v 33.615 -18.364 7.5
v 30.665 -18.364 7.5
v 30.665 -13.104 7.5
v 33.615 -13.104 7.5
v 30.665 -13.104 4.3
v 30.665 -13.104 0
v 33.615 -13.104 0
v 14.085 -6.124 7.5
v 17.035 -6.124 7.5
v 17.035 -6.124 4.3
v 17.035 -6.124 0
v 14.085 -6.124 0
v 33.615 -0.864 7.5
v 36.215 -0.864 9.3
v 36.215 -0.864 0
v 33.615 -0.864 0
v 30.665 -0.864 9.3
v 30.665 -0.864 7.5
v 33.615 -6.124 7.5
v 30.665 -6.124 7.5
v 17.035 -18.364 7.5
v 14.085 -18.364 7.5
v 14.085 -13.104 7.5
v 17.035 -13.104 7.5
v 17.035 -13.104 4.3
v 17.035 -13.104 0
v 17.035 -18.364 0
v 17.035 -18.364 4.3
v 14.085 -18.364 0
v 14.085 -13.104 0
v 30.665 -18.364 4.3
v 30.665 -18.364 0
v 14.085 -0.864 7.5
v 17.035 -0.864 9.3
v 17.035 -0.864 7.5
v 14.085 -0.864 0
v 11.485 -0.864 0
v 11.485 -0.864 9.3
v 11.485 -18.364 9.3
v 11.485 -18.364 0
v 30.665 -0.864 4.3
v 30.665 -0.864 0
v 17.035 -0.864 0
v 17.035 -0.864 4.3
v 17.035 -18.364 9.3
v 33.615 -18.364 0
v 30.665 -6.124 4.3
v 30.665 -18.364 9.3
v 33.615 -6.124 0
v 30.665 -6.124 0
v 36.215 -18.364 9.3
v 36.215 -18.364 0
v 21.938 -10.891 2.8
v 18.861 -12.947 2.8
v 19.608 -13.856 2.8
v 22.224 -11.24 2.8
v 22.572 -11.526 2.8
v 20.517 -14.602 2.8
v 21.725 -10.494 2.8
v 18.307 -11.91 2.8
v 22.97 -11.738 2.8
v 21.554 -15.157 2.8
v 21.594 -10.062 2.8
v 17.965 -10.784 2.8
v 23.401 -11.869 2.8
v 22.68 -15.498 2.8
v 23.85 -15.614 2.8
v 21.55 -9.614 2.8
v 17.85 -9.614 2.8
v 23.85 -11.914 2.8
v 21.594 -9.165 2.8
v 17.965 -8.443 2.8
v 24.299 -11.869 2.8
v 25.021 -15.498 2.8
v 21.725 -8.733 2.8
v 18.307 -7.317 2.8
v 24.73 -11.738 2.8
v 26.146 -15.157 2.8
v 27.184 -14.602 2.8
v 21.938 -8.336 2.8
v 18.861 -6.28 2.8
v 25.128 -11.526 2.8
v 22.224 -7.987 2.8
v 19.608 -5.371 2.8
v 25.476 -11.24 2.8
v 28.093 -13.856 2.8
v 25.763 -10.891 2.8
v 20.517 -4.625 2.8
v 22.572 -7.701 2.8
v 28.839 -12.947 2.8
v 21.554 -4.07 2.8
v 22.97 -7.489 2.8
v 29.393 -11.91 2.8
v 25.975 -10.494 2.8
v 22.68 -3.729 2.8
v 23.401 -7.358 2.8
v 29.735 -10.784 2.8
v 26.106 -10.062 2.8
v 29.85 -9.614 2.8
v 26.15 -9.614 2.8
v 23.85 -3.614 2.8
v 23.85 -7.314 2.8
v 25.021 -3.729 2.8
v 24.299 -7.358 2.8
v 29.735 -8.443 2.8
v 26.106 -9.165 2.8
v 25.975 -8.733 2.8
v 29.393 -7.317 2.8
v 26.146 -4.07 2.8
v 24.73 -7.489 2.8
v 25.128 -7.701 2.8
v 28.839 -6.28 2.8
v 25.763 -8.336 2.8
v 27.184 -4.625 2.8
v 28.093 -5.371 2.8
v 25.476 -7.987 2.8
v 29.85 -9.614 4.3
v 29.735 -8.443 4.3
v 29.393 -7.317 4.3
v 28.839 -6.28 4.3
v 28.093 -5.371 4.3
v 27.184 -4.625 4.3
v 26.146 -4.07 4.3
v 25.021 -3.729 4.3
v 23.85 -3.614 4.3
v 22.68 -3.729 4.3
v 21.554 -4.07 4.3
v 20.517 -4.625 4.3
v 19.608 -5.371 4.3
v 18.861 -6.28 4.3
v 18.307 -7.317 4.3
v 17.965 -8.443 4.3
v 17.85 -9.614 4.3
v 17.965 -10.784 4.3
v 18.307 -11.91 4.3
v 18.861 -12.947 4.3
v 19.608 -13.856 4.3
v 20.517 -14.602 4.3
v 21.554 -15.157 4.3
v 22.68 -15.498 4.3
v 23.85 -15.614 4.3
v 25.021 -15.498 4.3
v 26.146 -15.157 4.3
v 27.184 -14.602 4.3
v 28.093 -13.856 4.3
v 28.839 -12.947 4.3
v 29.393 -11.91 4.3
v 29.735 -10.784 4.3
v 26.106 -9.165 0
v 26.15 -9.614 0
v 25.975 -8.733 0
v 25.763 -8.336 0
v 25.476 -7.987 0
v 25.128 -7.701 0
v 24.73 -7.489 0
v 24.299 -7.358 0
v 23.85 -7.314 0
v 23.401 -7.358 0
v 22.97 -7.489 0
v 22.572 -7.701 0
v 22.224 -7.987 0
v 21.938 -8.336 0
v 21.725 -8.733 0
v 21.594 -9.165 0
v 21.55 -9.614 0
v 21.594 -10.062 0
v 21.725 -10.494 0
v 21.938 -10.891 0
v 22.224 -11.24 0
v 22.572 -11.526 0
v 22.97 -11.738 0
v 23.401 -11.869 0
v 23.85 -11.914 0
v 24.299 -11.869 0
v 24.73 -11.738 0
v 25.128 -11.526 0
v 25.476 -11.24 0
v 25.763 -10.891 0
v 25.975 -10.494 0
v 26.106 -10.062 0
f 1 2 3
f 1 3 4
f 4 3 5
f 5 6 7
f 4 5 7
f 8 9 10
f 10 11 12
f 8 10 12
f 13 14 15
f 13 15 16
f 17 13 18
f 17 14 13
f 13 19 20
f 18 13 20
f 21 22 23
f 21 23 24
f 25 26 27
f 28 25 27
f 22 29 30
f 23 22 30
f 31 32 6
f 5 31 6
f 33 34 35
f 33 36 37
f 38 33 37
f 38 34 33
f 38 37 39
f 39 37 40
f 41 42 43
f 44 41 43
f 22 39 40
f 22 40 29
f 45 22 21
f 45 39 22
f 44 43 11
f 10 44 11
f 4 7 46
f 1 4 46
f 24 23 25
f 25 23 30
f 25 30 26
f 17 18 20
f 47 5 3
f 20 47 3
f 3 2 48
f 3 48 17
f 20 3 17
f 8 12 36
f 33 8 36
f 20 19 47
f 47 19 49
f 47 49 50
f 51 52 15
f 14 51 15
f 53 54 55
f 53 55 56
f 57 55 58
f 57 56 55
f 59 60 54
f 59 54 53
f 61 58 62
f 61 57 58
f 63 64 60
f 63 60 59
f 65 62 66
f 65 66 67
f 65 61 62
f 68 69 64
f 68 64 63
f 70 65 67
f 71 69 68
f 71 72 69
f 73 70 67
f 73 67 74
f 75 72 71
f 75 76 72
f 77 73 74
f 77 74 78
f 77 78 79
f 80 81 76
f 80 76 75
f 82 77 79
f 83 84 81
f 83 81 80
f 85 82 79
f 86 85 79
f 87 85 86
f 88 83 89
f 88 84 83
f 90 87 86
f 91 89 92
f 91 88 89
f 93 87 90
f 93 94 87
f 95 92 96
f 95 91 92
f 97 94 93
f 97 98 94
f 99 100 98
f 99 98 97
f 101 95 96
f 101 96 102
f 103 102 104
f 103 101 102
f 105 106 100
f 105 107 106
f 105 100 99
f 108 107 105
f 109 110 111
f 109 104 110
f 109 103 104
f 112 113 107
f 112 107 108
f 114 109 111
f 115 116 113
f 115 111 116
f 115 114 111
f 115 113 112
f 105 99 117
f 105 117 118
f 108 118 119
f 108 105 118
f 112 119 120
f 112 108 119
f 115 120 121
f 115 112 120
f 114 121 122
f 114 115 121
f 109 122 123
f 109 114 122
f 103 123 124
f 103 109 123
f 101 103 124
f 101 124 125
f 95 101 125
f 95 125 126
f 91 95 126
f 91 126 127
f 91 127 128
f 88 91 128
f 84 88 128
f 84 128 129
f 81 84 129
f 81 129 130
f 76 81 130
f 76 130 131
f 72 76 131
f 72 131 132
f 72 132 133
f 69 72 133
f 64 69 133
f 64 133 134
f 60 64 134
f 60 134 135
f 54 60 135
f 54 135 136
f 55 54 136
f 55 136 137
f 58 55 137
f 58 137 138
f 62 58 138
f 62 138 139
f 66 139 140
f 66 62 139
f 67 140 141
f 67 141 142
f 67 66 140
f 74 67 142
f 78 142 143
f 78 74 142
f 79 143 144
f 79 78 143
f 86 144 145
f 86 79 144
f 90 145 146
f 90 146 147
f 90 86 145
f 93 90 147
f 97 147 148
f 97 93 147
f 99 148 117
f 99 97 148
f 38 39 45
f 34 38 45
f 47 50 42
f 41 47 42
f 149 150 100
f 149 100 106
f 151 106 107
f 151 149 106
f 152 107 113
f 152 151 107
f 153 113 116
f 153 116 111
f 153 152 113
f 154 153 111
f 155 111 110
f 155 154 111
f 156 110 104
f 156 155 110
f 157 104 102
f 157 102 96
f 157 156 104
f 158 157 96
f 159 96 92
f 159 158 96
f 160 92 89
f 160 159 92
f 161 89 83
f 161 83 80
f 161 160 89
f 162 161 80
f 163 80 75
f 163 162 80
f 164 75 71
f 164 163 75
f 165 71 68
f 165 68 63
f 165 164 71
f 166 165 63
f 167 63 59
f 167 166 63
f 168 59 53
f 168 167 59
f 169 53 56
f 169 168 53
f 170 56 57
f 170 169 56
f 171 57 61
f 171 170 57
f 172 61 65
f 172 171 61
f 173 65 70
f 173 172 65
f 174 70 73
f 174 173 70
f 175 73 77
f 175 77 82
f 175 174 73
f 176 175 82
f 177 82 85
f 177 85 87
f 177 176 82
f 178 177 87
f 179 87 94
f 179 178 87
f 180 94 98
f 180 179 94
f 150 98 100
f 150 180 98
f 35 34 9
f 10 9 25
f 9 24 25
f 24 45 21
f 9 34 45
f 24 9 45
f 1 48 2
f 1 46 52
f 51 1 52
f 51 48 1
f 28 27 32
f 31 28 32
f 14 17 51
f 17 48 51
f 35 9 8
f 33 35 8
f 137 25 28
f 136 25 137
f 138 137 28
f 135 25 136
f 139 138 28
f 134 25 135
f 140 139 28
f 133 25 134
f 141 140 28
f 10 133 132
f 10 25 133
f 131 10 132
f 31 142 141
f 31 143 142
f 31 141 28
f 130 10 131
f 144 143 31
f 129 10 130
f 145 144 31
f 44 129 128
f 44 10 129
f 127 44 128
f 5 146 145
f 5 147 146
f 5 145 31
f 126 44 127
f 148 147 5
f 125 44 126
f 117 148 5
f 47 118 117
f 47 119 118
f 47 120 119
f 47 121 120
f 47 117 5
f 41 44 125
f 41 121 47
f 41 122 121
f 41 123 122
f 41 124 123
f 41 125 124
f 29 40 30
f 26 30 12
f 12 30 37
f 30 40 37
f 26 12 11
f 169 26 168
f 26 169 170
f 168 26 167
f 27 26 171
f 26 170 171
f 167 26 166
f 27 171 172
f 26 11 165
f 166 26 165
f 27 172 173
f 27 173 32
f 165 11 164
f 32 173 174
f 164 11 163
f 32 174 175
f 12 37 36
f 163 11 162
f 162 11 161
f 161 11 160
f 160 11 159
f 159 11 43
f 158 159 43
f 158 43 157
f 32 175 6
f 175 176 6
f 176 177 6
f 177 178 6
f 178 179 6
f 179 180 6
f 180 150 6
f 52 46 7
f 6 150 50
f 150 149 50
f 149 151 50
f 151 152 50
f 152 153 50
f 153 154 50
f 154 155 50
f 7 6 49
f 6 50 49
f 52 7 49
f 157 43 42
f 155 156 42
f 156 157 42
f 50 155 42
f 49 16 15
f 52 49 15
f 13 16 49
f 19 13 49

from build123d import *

# Parameters (mm, degrees)
F1_DEPTH = 9.3
F0_R     = 6
F2_DEPTH = 4.3
F0_R_2   = 2.3
F3_DEPTH = 2.8
F5_DEPTH = 5.26
F6_DEPTH = 5.26
F8_DEPTH = 5.26
F9_DEPTH = 5.26


with BuildPart() as f1:
    # F0 (on Top) → F1 (new body)
    with BuildSketch(Plane.XY):
        Polygon((36.2151488662, -0.8635242283), (33.6151488662, -0.8635242283), (33.6151488662, -6.1235242283), (30.6651488662, -6.1235242283), (30.6651488662, -13.1035242283), (33.6151488662, -13.1035242283), (33.6151488662, -18.3635242283), (36.2151488662, -18.3635242283), align=None)
    extrude(amount=F1_DEPTH)



with BuildPart() as f1b:
    # F0 (on Top) → F1, piece 2 (new body)
    with BuildSketch(Plane.XY):
        Polygon((14.0851488662, -0.8635242283), (11.4851488662, -0.8635242283), (11.4851488662, -18.3635242283), (14.0851488662, -18.3635242283), (14.0851488662, -13.1035242283), (17.0351488662, -13.1035242283), (17.0351488662, -6.1235242283), (14.0851488662, -6.1235242283), align=None)
    extrude(amount=F1_DEPTH)


with BuildPart() as f1_1:
    add(f1.part)

    add(f1b.part)  # F2 merges F1b
    # F0 (on Top) → F2 (join)
    with BuildSketch(Plane.XY):
        Polygon((30.6651488662, -0.8635242283), (17.0351488662, -0.8635242283), (17.0351488662, -6.1235242283), (17.0351488662, -13.1035242283), (17.0351488662, -18.3635242283), (30.6651488662, -18.3635242283), (30.6651488662, -13.1035242283), (30.6651488662, -6.1235242283), align=None)
        with Locations((23.8501488662, -9.6135242283)):
            Circle(F0_R, mode=Mode.SUBTRACT)
    extrude(amount=F2_DEPTH)

    # F0 (on Top) → F3 (join)
    with BuildSketch(Plane.XY):
        with Locations((23.8501488662, -9.6135242283)):
            Circle(F0_R)
        with Locations((23.8501488662, -9.6135242283)):
            Circle(F0_R_2, mode=Mode.SUBTRACT)
    extrude(amount=F3_DEPTH)

    # F4 (on face) → F5 (join)
    with BuildSketch(Plane.XZ.offset(13.1035242283)):
        Polygon((15.3120337054, 7.5), (17.0351488662, 7.5), (17.0351488662, 9.3), (14.0851488662, 9.3), (14.0851488662, 7.5), align=None)
    extrude(amount=F5_DEPTH)

    # F4 (on face) → F6 (join)
    with BuildSketch(Plane.XZ.offset(13.1035242283)):
        Polygon((32.3882640269, 7.5), (33.6151488662, 7.5), (33.6151488662, 9.3), (30.6651488662, 9.3), (30.6651488662, 7.5), align=None)
    extrude(amount=F6_DEPTH)

    # F7 (on face) → F8 (join)
    with BuildSketch(Plane(origin=(0, -6.1235242283, 0), x_dir=(-1, 0, 0), z_dir=(0, 1, 0))):
        Polygon((-32.1401488662, 7.5), (-30.6651488662, 7.5), (-30.6651488662, 9.3), (-33.6151488662, 9.3), (-33.6151488662, 7.5), align=None)
    extrude(amount=F8_DEPTH)

    # F7 (on face) → F9 (join)
    with BuildSketch(Plane(origin=(0, -6.1235242283, 0), x_dir=(-1, 0, 0), z_dir=(0, 1, 0))):
        Polygon((-15.5601488662, 7.5), (-14.0851488662, 7.5), (-14.0851488662, 9.3), (-17.0351488662, 9.3), (-17.0351488662, 7.5), align=None)
    extrude(amount=F9_DEPTH)


solid = f1_1.part
